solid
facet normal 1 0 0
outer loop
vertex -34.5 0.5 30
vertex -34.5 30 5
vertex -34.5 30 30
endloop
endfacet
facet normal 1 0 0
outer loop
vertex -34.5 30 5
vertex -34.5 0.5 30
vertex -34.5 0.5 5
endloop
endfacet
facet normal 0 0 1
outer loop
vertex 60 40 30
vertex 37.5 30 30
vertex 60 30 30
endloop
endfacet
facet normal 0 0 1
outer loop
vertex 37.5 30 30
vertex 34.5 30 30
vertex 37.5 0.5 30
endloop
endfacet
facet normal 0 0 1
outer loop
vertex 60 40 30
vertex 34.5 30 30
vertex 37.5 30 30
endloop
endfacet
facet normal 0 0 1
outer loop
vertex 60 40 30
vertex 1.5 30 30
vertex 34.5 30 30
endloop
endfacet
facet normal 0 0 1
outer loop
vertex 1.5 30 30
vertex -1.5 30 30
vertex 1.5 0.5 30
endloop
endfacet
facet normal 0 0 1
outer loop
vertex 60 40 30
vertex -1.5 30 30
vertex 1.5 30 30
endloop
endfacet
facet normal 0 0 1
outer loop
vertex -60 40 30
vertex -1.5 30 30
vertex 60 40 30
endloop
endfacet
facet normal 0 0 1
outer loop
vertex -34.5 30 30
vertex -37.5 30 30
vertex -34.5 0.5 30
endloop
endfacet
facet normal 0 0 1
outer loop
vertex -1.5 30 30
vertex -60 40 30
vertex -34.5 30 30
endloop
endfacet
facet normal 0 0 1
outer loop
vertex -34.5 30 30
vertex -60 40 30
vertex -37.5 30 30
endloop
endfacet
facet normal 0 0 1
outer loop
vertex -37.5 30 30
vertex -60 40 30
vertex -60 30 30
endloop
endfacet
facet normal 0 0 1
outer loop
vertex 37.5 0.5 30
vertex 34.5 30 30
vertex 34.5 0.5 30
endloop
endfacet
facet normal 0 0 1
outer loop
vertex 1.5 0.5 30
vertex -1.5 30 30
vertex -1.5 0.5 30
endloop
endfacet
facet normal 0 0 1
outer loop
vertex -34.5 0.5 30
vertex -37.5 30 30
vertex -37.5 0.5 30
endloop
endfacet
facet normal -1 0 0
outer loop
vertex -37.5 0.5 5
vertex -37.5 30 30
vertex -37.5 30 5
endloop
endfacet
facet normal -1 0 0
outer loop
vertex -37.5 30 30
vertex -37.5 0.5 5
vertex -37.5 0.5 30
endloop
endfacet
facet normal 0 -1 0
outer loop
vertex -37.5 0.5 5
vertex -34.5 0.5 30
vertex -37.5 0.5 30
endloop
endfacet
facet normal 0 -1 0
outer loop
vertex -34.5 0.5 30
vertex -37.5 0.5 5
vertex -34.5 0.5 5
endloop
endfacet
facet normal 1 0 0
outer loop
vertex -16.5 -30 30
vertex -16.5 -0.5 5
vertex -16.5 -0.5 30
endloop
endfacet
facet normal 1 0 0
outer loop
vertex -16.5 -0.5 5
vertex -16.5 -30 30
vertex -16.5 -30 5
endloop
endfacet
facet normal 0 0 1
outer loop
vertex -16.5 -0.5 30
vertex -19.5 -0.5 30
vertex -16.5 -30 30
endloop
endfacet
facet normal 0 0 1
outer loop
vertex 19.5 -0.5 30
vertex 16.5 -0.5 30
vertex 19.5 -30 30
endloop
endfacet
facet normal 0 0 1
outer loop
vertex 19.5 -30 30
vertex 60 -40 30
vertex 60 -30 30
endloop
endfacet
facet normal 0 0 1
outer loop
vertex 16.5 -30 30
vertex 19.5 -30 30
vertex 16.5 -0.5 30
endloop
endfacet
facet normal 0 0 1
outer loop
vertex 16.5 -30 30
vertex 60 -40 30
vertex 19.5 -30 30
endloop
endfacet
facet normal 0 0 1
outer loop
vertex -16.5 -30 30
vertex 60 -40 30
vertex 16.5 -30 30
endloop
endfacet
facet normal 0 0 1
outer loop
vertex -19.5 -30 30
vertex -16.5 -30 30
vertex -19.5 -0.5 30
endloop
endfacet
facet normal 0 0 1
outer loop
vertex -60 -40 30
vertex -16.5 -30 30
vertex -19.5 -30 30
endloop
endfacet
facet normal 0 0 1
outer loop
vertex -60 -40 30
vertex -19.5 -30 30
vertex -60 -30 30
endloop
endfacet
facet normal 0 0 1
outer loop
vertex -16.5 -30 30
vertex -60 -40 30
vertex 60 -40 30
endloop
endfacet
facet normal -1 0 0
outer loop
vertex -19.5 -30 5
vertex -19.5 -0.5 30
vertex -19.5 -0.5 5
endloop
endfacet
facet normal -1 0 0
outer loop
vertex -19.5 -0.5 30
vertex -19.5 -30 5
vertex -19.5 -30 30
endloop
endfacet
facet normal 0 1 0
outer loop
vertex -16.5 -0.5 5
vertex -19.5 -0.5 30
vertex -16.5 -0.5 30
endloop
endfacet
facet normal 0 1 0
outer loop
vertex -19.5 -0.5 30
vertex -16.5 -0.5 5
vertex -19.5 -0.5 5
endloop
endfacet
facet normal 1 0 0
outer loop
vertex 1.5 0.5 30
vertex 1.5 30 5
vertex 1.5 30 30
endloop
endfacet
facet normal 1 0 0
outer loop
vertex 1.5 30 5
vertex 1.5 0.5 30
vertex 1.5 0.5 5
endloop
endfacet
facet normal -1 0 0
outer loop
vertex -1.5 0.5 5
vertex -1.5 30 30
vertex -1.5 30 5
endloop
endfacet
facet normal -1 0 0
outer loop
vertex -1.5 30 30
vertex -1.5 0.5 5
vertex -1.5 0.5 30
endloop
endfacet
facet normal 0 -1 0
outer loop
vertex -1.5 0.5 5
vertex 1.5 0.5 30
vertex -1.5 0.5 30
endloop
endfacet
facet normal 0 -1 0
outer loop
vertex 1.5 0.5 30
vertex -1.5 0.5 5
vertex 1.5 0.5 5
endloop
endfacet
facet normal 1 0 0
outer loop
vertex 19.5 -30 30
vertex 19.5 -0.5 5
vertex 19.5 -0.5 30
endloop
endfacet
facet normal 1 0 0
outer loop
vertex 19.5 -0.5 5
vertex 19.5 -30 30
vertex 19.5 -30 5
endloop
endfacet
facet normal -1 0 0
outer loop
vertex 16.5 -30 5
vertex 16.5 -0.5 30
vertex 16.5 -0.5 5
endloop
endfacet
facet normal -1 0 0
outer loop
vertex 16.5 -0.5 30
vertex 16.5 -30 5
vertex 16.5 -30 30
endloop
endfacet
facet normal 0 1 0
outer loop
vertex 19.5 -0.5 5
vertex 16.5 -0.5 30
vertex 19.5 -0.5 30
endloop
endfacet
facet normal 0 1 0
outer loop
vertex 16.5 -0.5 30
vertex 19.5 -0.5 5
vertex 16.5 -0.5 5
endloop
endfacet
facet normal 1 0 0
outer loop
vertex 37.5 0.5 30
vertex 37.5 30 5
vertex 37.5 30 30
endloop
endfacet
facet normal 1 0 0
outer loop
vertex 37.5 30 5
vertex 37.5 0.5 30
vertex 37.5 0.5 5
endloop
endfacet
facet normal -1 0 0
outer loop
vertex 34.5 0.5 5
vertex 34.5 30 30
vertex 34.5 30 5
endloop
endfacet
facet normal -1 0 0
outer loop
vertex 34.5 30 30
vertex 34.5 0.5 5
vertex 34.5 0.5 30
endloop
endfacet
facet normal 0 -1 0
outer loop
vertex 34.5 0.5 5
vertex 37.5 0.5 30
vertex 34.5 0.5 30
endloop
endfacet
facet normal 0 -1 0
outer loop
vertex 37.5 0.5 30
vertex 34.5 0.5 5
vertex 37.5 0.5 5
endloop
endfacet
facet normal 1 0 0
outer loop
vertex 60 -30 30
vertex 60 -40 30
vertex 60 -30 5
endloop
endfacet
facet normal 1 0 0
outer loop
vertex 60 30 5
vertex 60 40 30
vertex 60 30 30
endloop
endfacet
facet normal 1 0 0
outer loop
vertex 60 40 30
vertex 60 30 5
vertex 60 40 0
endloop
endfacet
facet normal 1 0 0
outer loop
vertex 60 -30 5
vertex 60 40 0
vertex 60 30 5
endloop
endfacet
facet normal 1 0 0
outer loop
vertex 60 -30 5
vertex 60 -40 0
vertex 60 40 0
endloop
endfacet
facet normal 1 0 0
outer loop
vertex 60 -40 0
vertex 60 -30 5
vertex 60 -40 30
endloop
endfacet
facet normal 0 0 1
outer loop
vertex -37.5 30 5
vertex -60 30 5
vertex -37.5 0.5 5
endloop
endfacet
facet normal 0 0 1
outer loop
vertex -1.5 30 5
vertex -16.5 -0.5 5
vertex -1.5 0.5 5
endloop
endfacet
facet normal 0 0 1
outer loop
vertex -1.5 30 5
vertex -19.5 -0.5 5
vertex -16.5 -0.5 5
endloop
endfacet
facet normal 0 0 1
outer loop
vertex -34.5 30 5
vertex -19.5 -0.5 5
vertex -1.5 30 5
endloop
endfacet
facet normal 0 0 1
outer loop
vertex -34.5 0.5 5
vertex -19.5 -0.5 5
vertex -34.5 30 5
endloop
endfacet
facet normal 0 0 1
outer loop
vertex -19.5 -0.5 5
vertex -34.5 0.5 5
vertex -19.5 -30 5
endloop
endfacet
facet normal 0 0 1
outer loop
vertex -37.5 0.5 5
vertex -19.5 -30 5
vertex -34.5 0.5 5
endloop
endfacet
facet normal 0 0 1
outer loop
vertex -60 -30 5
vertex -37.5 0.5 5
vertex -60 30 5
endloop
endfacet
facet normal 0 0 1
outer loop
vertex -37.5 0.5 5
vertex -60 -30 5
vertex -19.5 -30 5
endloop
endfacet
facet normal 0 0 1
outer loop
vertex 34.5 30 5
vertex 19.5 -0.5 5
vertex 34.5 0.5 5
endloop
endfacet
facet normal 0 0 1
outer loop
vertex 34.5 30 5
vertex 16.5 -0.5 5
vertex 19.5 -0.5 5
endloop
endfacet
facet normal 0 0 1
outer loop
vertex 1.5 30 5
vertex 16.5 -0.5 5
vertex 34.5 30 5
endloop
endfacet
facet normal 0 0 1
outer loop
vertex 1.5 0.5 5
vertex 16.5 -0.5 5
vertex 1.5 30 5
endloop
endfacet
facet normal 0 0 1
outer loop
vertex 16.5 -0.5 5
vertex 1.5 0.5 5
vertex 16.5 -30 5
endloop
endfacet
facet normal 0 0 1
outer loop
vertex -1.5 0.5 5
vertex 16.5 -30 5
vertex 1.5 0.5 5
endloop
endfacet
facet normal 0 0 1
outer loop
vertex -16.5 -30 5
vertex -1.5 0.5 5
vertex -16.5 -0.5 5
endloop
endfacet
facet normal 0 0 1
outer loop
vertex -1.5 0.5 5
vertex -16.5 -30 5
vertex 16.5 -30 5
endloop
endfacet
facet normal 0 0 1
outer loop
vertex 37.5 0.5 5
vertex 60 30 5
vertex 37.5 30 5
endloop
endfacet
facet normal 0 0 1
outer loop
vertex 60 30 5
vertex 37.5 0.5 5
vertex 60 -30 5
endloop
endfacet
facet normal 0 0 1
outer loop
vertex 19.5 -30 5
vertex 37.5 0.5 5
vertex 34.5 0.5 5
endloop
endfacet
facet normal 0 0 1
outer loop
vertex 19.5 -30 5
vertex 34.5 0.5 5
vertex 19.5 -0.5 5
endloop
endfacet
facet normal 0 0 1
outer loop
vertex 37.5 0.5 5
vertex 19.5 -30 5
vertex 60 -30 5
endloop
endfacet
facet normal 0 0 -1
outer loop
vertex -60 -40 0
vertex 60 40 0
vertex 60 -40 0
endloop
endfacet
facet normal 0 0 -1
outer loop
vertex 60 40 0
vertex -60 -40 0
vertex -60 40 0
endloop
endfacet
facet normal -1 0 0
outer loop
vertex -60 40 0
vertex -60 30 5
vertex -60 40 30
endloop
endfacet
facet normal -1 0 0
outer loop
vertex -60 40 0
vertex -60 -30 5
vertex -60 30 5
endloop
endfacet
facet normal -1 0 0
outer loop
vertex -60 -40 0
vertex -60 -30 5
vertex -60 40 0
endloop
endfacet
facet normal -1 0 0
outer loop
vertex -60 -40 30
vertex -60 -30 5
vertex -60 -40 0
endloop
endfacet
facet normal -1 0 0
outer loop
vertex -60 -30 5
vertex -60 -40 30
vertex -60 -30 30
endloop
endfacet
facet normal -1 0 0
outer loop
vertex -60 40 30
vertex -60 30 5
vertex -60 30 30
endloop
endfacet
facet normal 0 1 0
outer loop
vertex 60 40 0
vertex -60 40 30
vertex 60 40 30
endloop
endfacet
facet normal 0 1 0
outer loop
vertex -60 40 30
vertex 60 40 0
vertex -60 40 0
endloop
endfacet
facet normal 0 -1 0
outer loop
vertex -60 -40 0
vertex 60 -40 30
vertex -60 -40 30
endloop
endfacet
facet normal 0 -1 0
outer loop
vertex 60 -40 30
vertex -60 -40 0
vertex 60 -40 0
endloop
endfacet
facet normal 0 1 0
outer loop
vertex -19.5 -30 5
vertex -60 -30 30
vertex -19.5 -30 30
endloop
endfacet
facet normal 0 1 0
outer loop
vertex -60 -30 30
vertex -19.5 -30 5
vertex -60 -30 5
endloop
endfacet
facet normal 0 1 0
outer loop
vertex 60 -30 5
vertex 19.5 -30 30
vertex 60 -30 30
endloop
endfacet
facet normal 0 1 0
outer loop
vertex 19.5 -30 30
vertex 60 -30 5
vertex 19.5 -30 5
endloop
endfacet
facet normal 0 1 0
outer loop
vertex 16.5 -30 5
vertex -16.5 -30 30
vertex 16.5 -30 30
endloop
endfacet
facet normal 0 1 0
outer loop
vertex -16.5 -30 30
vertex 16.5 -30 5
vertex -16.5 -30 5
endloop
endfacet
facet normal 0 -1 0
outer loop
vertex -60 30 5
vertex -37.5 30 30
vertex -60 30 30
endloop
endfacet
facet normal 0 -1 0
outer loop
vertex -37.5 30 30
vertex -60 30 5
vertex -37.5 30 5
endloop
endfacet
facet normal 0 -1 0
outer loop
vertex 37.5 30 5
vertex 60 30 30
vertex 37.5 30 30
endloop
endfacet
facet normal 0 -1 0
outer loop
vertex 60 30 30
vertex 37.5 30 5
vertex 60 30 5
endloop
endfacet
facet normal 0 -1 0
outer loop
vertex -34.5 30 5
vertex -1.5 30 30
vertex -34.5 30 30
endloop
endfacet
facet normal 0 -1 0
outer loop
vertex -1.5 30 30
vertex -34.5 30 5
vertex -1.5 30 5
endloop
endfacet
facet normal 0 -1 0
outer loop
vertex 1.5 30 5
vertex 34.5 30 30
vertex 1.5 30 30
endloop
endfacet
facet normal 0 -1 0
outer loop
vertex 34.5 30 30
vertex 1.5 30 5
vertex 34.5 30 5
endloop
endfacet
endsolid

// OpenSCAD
$fn = 32;

// ----------------------------------------------------------------------
// Rib frame 120 x 80 x 30
// 5 ribs at 18 mm pitch, staggered
// ----------------------------------------------------------------------

// --- parameters (mm) ---
frame = [120, 80, 5];  // base plate size (x, y, z)
rail_w = 10;           // side rail width
ribs = 5;              // number of ribs
rib_t = 3;             // rib thickness
rib_h = 25;            // rib height above the base plate
pitch = 18;            // pitch between rib centres

// --- derived feature positions (mm) ---
span = (ribs - 1) * pitch;          // = 72   distance between the outer ribs
origin_x = -span / 2;               // = -36   X of the first rib
rib_len = frame[1] / 2 - rail_w + 0.5;  // = 30.5   length of a staggered rib
rib_y = 0.5 + rib_len / 2;          // = 15.75   Y of a staggered rib centre
row_offset = 2 * rib_y;             // = 31.5   distance between the two rows
feature_centers = [
  [origin_x + 0 * pitch, rib_y],
  [origin_x + 1 * pitch, -rib_y],
  [origin_x + 2 * pitch, rib_y],
  [origin_x + 3 * pitch, -rib_y],
  [origin_x + 4 * pitch, rib_y]
];   // rib centre line, drives the rib loop

// base plate, two side rails, then the ribs read straight off feature_centers
union() {
  translate([-frame[0] / 2, -frame[1] / 2, 0]) cube(frame);
  translate([-frame[0] / 2, -frame[1] / 2, 0]) cube([frame[0], rail_w, frame[2] + rib_h]);
  translate([-frame[0] / 2, frame[1] / 2 - rail_w, 0]) cube([frame[0], rail_w, frame[2] + rib_h]);
  for (centre = feature_centers)
    translate([centre[0] - rib_t / 2, centre[1] - rib_len / 2, frame[2] - 1])
      cube([rib_t, rib_len, rib_h + 1]);
}
